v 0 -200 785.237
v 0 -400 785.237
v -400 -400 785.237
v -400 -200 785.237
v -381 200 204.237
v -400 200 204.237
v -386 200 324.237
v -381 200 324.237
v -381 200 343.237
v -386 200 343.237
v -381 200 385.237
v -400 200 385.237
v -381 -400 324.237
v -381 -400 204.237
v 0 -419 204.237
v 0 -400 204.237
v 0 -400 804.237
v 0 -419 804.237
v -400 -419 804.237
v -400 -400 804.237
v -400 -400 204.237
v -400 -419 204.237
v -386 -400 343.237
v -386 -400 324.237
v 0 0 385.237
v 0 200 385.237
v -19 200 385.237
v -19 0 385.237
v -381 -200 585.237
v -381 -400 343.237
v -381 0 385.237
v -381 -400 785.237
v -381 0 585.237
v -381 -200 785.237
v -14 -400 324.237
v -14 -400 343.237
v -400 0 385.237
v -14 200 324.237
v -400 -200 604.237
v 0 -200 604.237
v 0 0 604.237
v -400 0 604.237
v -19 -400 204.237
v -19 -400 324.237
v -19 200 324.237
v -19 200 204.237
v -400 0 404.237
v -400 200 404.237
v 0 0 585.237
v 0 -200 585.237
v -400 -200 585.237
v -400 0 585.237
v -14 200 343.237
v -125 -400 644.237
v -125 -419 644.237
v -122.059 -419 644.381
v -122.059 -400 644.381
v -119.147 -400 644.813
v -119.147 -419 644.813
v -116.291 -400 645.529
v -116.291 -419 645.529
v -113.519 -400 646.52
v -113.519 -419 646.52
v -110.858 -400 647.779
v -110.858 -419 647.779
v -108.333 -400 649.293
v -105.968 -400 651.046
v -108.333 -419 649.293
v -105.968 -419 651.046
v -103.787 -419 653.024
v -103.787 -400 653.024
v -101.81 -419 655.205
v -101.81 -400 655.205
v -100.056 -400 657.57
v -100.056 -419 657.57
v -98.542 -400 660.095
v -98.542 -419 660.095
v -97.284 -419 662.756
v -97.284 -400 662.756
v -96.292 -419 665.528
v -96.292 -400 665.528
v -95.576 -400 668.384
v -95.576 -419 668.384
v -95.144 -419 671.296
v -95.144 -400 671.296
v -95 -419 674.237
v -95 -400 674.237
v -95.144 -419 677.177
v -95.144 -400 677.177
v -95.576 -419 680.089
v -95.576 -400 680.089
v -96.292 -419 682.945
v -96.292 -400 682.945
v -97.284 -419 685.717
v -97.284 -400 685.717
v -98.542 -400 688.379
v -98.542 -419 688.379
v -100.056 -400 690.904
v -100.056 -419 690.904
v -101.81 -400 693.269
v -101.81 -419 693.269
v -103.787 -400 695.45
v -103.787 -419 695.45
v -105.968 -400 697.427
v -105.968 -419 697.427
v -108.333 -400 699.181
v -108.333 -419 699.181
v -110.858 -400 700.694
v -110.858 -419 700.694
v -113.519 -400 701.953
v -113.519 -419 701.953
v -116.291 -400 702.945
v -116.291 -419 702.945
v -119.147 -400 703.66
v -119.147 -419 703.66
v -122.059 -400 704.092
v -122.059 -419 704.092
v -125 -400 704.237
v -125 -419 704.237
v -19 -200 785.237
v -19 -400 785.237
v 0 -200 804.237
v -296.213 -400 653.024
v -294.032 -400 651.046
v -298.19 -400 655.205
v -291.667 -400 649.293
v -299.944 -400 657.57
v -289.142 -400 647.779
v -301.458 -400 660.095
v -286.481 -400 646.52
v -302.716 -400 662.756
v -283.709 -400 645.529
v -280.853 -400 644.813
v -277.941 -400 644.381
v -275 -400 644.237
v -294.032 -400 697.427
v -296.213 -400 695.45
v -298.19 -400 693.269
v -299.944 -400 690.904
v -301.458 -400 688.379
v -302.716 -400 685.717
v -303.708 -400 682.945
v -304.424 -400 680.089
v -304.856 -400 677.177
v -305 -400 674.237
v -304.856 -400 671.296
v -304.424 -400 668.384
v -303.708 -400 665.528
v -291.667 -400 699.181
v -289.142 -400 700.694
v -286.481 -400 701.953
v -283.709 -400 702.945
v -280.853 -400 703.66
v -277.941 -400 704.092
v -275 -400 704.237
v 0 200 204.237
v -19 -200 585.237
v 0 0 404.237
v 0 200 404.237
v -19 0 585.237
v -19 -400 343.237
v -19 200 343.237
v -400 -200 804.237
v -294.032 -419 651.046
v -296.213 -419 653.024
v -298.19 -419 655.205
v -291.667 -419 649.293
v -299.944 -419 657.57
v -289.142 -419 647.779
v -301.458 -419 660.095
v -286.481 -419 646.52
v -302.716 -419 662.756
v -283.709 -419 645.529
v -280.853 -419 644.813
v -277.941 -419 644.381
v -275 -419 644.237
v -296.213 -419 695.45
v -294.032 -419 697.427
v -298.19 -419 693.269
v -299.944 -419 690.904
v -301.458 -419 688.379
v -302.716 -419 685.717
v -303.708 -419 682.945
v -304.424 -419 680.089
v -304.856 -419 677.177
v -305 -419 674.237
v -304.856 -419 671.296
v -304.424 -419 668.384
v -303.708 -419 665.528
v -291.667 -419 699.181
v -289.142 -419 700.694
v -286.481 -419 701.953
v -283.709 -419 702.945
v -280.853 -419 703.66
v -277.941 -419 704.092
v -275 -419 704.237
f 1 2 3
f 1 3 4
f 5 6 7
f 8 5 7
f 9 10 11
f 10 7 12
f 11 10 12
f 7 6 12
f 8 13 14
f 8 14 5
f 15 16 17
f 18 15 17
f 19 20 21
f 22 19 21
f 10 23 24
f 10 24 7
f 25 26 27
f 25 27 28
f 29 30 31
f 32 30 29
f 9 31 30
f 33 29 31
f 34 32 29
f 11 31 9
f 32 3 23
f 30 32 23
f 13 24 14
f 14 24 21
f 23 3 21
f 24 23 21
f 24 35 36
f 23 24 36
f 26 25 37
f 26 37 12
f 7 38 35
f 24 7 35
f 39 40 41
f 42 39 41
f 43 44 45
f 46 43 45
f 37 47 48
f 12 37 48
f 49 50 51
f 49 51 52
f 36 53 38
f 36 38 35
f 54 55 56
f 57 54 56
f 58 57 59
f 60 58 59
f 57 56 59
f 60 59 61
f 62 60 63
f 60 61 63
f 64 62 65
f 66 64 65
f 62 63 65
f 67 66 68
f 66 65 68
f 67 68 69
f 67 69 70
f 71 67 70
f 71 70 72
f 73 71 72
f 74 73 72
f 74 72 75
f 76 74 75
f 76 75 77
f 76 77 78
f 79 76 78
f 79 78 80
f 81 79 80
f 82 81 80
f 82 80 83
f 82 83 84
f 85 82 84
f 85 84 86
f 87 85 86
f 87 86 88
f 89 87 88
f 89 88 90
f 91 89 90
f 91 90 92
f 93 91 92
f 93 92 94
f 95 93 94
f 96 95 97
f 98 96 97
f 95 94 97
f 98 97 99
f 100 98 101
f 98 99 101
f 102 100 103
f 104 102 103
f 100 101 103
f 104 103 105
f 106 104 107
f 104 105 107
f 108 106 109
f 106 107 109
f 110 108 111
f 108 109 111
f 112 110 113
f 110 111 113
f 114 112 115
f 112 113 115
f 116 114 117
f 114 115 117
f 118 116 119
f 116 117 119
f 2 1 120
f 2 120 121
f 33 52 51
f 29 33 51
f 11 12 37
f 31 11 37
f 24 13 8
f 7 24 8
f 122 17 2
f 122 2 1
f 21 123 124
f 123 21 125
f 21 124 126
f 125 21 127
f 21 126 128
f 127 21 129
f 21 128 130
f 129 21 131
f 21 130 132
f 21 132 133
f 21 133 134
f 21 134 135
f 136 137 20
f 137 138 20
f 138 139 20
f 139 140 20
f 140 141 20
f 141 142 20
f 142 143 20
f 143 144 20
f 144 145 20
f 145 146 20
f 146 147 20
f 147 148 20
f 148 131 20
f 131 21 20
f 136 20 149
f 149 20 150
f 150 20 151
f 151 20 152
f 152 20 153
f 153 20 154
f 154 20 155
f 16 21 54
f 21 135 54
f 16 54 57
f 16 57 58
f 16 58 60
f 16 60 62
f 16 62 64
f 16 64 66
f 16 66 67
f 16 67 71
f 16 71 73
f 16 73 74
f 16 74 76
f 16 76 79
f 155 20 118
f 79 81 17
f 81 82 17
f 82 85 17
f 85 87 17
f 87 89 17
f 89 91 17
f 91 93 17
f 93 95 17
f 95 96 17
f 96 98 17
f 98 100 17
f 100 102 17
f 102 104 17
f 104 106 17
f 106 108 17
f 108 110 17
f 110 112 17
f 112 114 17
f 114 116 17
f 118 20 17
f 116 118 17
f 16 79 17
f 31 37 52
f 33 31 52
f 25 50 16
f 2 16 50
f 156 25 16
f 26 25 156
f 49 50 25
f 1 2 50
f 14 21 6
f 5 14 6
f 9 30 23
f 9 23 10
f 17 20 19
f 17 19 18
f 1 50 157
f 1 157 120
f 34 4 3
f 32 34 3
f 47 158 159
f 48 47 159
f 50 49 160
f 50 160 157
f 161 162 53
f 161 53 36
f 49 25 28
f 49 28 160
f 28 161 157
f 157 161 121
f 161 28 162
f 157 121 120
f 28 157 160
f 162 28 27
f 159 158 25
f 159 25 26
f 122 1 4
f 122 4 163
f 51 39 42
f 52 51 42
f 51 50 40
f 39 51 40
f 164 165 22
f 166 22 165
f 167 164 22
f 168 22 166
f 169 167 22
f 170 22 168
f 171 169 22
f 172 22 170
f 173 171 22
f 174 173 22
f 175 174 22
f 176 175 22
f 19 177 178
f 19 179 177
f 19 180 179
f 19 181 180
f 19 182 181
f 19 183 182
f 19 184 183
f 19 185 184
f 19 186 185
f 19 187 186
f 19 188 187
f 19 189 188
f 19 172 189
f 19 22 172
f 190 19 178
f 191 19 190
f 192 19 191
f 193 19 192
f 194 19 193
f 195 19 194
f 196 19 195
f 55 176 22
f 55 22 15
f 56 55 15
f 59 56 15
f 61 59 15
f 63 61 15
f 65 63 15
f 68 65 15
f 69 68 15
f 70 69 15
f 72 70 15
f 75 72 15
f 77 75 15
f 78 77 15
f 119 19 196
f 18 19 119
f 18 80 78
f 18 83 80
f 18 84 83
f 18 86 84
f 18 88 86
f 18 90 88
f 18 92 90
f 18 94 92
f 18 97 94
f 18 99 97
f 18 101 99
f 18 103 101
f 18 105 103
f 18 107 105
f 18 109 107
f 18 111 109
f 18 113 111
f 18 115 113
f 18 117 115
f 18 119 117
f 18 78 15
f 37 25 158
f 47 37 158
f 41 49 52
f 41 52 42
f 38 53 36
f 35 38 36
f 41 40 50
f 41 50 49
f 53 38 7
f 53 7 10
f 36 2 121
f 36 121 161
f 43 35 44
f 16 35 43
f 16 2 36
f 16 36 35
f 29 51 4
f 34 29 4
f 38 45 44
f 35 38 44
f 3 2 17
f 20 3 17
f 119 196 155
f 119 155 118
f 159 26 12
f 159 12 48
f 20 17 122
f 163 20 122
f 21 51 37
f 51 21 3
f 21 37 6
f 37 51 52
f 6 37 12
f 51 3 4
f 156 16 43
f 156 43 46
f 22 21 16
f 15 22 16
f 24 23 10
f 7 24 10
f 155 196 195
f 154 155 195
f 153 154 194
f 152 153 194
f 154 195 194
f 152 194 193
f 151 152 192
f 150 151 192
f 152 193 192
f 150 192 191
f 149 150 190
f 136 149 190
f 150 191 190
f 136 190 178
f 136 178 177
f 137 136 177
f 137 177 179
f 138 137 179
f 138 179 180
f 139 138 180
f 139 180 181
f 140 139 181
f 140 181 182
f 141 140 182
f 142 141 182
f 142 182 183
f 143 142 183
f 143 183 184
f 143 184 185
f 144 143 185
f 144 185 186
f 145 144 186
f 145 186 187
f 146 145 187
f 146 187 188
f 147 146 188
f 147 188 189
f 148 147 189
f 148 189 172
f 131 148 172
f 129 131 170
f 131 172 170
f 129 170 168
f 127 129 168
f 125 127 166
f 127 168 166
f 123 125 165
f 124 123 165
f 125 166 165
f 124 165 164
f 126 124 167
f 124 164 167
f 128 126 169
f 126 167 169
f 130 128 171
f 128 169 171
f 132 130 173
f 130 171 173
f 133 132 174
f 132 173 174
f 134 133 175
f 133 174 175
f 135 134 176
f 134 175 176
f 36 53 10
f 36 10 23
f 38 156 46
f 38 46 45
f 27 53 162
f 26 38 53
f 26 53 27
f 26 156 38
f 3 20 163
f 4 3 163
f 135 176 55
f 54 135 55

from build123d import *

# Parameters (mm, degrees)
F1_DEPTH  = 19
F0_W      = 200
F0_H      = 19
F2_DEPTH  = 400
F5_DEPTH  = 19
F6_W      = 400
F6_H      = 19
F6_H_2    = 581
F7_DEPTH  = 19
F9_W      = 362
F9_H      = 600
F10_DEPTH = 19
F11_W     = 600
F11_H     = 19
F12_DEPTH = 5
F13_W     = 600
F13_H     = 19
F14_DEPTH = 5
F15_DEPTH = 5
F16_DEPTH = 5
F17_W     = 150
F17_H     = 60
F18_DEPTH = 25


with BuildPart() as f1:
    # F0 (on Right) → F1 (new body)
    with BuildSketch(Plane.YZ):
        Polygon((-200, 785.2367818364), (-400, 785.2367818364), (-400, 204.2367818364), (200, 204.2367818364), (200, 385.2367818364), (0, 385.2367818364), (0, 404.2367818364), (0, 585.2367818364), (-200, 585.2367818364), (-200, 604.2367818364), align=None)
    extrude(amount=-F1_DEPTH)

    # F11 (on face) → F12 (cut)
    with BuildSketch(Plane(origin=(-19, 0, 0), x_dir=(0, -1, 0), z_dir=(-1, 0, 0))):
        with Locations((100, 333.7367818364)):
            Rectangle(F11_W, F11_H)
    extrude(amount=-F12_DEPTH, mode=Mode.SUBTRACT)


with BuildPart() as f2:
    # F0 (on Right) → F2 (new body)
    with BuildSketch(Plane.YZ):
        with Locations((-300, 794.7367818364)):
            Rectangle(F0_W, F0_H)
    extrude(amount=-F2_DEPTH)


with BuildPart() as f2b:
    # F0 (on Right) → F2, piece 2 (new body)
    with BuildSketch(Plane.YZ):
        with Locations((-100, 594.7367818364)):
            Rectangle(F0_W, F0_H)
    extrude(amount=-F2_DEPTH)


with BuildPart() as f2c:
    # F0 (on Right) → F2, piece 3 (new body)
    with BuildSketch(Plane.YZ):
        with Locations((100, 394.7367818364)):
            Rectangle(F0_W, F0_H)
    extrude(amount=-F2_DEPTH)


with BuildPart() as f5:
    # F4 (on offset) → F5 (new body)
    with BuildSketch(Plane.YZ.offset(-400)):
        Polygon((-200, 585.2367818364), (-200, 604.2367818364), (-200, 785.2367818364), (-400, 785.2367818364), (-400, 204.2367818364), (200, 204.2367818364), (200, 385.2367818364), (0, 385.2367818364), (0, 404.2367818364), (0, 585.2367818364), align=None)
    extrude(amount=F5_DEPTH)

    # F13 (on face) → F14 (cut)
    with BuildSketch(Plane.YZ.offset(-381)):
        with Locations((-100, 333.7367818364)):
            Rectangle(F13_W, F13_H)
    extrude(amount=-F14_DEPTH, mode=Mode.SUBTRACT)


with BuildPart() as f7:
    # F6 (on face) → F7 (new body)
    with BuildSketch(Plane.XZ.offset(400)):
        with Locations((-200, 794.7367818364)):
            Rectangle(F6_W, F6_H)
        with Locations((-200, 494.7367818364)):
            Rectangle(F6_W, F6_H_2)
    extrude(amount=F7_DEPTH)

    # F17 (on face) → F18 (cut)
    with BuildSketch(Plane.XZ.offset(419)):
        with Locations((-200, 674.2367818364)):
            Rectangle(F17_W, F17_H)
        with BuildLine():
            Line((-275, 644.2367818364), (-275, 704.2367818364))
            ThreePointArc((-275, 704.2367818364), (-304.9999995967, 674.2367818364), (-275, 644.2367818364))
        make_face()
        with BuildLine():
            ThreePointArc((-125, 644.2367818364), (-95, 674.2367818364), (-125, 704.2367818364))
            Line((-125, 704.2367818364), (-125, 644.2367818364))
        make_face()
    extrude(amount=-F18_DEPTH, mode=Mode.SUBTRACT)


with BuildPart() as f10:
    # F9 (on offset) → F10 (new body)
    with BuildSketch(Plane(origin=(0, 0, 324.2367818364), x_dir=(1, 0, 0), z_dir=(0, 0, -1))):
        with Locations((-200, 100)):
            Rectangle(F9_W, F9_H)
    extrude(amount=-F10_DEPTH)

    # F15 (add, through all): a face of the model
    f15_faces = [f5.part.faces().sort_by_distance(p)[0] for p in [
        (-386, -100, 333.7367818364),
    ]]
    extrude(f15_faces, amount=F15_DEPTH)

    # F16 (add, through all): a face of the model
    f16_faces = [f1.part.faces().sort_by_distance(p)[0] for p in [
        (-14, -100, 333.7367818364),
    ]]
    extrude(f16_faces, amount=F16_DEPTH)


solid = Compound([f1.part, f2.part, f2b.part, f2c.part, f5.part, f7.part, f10.part])
